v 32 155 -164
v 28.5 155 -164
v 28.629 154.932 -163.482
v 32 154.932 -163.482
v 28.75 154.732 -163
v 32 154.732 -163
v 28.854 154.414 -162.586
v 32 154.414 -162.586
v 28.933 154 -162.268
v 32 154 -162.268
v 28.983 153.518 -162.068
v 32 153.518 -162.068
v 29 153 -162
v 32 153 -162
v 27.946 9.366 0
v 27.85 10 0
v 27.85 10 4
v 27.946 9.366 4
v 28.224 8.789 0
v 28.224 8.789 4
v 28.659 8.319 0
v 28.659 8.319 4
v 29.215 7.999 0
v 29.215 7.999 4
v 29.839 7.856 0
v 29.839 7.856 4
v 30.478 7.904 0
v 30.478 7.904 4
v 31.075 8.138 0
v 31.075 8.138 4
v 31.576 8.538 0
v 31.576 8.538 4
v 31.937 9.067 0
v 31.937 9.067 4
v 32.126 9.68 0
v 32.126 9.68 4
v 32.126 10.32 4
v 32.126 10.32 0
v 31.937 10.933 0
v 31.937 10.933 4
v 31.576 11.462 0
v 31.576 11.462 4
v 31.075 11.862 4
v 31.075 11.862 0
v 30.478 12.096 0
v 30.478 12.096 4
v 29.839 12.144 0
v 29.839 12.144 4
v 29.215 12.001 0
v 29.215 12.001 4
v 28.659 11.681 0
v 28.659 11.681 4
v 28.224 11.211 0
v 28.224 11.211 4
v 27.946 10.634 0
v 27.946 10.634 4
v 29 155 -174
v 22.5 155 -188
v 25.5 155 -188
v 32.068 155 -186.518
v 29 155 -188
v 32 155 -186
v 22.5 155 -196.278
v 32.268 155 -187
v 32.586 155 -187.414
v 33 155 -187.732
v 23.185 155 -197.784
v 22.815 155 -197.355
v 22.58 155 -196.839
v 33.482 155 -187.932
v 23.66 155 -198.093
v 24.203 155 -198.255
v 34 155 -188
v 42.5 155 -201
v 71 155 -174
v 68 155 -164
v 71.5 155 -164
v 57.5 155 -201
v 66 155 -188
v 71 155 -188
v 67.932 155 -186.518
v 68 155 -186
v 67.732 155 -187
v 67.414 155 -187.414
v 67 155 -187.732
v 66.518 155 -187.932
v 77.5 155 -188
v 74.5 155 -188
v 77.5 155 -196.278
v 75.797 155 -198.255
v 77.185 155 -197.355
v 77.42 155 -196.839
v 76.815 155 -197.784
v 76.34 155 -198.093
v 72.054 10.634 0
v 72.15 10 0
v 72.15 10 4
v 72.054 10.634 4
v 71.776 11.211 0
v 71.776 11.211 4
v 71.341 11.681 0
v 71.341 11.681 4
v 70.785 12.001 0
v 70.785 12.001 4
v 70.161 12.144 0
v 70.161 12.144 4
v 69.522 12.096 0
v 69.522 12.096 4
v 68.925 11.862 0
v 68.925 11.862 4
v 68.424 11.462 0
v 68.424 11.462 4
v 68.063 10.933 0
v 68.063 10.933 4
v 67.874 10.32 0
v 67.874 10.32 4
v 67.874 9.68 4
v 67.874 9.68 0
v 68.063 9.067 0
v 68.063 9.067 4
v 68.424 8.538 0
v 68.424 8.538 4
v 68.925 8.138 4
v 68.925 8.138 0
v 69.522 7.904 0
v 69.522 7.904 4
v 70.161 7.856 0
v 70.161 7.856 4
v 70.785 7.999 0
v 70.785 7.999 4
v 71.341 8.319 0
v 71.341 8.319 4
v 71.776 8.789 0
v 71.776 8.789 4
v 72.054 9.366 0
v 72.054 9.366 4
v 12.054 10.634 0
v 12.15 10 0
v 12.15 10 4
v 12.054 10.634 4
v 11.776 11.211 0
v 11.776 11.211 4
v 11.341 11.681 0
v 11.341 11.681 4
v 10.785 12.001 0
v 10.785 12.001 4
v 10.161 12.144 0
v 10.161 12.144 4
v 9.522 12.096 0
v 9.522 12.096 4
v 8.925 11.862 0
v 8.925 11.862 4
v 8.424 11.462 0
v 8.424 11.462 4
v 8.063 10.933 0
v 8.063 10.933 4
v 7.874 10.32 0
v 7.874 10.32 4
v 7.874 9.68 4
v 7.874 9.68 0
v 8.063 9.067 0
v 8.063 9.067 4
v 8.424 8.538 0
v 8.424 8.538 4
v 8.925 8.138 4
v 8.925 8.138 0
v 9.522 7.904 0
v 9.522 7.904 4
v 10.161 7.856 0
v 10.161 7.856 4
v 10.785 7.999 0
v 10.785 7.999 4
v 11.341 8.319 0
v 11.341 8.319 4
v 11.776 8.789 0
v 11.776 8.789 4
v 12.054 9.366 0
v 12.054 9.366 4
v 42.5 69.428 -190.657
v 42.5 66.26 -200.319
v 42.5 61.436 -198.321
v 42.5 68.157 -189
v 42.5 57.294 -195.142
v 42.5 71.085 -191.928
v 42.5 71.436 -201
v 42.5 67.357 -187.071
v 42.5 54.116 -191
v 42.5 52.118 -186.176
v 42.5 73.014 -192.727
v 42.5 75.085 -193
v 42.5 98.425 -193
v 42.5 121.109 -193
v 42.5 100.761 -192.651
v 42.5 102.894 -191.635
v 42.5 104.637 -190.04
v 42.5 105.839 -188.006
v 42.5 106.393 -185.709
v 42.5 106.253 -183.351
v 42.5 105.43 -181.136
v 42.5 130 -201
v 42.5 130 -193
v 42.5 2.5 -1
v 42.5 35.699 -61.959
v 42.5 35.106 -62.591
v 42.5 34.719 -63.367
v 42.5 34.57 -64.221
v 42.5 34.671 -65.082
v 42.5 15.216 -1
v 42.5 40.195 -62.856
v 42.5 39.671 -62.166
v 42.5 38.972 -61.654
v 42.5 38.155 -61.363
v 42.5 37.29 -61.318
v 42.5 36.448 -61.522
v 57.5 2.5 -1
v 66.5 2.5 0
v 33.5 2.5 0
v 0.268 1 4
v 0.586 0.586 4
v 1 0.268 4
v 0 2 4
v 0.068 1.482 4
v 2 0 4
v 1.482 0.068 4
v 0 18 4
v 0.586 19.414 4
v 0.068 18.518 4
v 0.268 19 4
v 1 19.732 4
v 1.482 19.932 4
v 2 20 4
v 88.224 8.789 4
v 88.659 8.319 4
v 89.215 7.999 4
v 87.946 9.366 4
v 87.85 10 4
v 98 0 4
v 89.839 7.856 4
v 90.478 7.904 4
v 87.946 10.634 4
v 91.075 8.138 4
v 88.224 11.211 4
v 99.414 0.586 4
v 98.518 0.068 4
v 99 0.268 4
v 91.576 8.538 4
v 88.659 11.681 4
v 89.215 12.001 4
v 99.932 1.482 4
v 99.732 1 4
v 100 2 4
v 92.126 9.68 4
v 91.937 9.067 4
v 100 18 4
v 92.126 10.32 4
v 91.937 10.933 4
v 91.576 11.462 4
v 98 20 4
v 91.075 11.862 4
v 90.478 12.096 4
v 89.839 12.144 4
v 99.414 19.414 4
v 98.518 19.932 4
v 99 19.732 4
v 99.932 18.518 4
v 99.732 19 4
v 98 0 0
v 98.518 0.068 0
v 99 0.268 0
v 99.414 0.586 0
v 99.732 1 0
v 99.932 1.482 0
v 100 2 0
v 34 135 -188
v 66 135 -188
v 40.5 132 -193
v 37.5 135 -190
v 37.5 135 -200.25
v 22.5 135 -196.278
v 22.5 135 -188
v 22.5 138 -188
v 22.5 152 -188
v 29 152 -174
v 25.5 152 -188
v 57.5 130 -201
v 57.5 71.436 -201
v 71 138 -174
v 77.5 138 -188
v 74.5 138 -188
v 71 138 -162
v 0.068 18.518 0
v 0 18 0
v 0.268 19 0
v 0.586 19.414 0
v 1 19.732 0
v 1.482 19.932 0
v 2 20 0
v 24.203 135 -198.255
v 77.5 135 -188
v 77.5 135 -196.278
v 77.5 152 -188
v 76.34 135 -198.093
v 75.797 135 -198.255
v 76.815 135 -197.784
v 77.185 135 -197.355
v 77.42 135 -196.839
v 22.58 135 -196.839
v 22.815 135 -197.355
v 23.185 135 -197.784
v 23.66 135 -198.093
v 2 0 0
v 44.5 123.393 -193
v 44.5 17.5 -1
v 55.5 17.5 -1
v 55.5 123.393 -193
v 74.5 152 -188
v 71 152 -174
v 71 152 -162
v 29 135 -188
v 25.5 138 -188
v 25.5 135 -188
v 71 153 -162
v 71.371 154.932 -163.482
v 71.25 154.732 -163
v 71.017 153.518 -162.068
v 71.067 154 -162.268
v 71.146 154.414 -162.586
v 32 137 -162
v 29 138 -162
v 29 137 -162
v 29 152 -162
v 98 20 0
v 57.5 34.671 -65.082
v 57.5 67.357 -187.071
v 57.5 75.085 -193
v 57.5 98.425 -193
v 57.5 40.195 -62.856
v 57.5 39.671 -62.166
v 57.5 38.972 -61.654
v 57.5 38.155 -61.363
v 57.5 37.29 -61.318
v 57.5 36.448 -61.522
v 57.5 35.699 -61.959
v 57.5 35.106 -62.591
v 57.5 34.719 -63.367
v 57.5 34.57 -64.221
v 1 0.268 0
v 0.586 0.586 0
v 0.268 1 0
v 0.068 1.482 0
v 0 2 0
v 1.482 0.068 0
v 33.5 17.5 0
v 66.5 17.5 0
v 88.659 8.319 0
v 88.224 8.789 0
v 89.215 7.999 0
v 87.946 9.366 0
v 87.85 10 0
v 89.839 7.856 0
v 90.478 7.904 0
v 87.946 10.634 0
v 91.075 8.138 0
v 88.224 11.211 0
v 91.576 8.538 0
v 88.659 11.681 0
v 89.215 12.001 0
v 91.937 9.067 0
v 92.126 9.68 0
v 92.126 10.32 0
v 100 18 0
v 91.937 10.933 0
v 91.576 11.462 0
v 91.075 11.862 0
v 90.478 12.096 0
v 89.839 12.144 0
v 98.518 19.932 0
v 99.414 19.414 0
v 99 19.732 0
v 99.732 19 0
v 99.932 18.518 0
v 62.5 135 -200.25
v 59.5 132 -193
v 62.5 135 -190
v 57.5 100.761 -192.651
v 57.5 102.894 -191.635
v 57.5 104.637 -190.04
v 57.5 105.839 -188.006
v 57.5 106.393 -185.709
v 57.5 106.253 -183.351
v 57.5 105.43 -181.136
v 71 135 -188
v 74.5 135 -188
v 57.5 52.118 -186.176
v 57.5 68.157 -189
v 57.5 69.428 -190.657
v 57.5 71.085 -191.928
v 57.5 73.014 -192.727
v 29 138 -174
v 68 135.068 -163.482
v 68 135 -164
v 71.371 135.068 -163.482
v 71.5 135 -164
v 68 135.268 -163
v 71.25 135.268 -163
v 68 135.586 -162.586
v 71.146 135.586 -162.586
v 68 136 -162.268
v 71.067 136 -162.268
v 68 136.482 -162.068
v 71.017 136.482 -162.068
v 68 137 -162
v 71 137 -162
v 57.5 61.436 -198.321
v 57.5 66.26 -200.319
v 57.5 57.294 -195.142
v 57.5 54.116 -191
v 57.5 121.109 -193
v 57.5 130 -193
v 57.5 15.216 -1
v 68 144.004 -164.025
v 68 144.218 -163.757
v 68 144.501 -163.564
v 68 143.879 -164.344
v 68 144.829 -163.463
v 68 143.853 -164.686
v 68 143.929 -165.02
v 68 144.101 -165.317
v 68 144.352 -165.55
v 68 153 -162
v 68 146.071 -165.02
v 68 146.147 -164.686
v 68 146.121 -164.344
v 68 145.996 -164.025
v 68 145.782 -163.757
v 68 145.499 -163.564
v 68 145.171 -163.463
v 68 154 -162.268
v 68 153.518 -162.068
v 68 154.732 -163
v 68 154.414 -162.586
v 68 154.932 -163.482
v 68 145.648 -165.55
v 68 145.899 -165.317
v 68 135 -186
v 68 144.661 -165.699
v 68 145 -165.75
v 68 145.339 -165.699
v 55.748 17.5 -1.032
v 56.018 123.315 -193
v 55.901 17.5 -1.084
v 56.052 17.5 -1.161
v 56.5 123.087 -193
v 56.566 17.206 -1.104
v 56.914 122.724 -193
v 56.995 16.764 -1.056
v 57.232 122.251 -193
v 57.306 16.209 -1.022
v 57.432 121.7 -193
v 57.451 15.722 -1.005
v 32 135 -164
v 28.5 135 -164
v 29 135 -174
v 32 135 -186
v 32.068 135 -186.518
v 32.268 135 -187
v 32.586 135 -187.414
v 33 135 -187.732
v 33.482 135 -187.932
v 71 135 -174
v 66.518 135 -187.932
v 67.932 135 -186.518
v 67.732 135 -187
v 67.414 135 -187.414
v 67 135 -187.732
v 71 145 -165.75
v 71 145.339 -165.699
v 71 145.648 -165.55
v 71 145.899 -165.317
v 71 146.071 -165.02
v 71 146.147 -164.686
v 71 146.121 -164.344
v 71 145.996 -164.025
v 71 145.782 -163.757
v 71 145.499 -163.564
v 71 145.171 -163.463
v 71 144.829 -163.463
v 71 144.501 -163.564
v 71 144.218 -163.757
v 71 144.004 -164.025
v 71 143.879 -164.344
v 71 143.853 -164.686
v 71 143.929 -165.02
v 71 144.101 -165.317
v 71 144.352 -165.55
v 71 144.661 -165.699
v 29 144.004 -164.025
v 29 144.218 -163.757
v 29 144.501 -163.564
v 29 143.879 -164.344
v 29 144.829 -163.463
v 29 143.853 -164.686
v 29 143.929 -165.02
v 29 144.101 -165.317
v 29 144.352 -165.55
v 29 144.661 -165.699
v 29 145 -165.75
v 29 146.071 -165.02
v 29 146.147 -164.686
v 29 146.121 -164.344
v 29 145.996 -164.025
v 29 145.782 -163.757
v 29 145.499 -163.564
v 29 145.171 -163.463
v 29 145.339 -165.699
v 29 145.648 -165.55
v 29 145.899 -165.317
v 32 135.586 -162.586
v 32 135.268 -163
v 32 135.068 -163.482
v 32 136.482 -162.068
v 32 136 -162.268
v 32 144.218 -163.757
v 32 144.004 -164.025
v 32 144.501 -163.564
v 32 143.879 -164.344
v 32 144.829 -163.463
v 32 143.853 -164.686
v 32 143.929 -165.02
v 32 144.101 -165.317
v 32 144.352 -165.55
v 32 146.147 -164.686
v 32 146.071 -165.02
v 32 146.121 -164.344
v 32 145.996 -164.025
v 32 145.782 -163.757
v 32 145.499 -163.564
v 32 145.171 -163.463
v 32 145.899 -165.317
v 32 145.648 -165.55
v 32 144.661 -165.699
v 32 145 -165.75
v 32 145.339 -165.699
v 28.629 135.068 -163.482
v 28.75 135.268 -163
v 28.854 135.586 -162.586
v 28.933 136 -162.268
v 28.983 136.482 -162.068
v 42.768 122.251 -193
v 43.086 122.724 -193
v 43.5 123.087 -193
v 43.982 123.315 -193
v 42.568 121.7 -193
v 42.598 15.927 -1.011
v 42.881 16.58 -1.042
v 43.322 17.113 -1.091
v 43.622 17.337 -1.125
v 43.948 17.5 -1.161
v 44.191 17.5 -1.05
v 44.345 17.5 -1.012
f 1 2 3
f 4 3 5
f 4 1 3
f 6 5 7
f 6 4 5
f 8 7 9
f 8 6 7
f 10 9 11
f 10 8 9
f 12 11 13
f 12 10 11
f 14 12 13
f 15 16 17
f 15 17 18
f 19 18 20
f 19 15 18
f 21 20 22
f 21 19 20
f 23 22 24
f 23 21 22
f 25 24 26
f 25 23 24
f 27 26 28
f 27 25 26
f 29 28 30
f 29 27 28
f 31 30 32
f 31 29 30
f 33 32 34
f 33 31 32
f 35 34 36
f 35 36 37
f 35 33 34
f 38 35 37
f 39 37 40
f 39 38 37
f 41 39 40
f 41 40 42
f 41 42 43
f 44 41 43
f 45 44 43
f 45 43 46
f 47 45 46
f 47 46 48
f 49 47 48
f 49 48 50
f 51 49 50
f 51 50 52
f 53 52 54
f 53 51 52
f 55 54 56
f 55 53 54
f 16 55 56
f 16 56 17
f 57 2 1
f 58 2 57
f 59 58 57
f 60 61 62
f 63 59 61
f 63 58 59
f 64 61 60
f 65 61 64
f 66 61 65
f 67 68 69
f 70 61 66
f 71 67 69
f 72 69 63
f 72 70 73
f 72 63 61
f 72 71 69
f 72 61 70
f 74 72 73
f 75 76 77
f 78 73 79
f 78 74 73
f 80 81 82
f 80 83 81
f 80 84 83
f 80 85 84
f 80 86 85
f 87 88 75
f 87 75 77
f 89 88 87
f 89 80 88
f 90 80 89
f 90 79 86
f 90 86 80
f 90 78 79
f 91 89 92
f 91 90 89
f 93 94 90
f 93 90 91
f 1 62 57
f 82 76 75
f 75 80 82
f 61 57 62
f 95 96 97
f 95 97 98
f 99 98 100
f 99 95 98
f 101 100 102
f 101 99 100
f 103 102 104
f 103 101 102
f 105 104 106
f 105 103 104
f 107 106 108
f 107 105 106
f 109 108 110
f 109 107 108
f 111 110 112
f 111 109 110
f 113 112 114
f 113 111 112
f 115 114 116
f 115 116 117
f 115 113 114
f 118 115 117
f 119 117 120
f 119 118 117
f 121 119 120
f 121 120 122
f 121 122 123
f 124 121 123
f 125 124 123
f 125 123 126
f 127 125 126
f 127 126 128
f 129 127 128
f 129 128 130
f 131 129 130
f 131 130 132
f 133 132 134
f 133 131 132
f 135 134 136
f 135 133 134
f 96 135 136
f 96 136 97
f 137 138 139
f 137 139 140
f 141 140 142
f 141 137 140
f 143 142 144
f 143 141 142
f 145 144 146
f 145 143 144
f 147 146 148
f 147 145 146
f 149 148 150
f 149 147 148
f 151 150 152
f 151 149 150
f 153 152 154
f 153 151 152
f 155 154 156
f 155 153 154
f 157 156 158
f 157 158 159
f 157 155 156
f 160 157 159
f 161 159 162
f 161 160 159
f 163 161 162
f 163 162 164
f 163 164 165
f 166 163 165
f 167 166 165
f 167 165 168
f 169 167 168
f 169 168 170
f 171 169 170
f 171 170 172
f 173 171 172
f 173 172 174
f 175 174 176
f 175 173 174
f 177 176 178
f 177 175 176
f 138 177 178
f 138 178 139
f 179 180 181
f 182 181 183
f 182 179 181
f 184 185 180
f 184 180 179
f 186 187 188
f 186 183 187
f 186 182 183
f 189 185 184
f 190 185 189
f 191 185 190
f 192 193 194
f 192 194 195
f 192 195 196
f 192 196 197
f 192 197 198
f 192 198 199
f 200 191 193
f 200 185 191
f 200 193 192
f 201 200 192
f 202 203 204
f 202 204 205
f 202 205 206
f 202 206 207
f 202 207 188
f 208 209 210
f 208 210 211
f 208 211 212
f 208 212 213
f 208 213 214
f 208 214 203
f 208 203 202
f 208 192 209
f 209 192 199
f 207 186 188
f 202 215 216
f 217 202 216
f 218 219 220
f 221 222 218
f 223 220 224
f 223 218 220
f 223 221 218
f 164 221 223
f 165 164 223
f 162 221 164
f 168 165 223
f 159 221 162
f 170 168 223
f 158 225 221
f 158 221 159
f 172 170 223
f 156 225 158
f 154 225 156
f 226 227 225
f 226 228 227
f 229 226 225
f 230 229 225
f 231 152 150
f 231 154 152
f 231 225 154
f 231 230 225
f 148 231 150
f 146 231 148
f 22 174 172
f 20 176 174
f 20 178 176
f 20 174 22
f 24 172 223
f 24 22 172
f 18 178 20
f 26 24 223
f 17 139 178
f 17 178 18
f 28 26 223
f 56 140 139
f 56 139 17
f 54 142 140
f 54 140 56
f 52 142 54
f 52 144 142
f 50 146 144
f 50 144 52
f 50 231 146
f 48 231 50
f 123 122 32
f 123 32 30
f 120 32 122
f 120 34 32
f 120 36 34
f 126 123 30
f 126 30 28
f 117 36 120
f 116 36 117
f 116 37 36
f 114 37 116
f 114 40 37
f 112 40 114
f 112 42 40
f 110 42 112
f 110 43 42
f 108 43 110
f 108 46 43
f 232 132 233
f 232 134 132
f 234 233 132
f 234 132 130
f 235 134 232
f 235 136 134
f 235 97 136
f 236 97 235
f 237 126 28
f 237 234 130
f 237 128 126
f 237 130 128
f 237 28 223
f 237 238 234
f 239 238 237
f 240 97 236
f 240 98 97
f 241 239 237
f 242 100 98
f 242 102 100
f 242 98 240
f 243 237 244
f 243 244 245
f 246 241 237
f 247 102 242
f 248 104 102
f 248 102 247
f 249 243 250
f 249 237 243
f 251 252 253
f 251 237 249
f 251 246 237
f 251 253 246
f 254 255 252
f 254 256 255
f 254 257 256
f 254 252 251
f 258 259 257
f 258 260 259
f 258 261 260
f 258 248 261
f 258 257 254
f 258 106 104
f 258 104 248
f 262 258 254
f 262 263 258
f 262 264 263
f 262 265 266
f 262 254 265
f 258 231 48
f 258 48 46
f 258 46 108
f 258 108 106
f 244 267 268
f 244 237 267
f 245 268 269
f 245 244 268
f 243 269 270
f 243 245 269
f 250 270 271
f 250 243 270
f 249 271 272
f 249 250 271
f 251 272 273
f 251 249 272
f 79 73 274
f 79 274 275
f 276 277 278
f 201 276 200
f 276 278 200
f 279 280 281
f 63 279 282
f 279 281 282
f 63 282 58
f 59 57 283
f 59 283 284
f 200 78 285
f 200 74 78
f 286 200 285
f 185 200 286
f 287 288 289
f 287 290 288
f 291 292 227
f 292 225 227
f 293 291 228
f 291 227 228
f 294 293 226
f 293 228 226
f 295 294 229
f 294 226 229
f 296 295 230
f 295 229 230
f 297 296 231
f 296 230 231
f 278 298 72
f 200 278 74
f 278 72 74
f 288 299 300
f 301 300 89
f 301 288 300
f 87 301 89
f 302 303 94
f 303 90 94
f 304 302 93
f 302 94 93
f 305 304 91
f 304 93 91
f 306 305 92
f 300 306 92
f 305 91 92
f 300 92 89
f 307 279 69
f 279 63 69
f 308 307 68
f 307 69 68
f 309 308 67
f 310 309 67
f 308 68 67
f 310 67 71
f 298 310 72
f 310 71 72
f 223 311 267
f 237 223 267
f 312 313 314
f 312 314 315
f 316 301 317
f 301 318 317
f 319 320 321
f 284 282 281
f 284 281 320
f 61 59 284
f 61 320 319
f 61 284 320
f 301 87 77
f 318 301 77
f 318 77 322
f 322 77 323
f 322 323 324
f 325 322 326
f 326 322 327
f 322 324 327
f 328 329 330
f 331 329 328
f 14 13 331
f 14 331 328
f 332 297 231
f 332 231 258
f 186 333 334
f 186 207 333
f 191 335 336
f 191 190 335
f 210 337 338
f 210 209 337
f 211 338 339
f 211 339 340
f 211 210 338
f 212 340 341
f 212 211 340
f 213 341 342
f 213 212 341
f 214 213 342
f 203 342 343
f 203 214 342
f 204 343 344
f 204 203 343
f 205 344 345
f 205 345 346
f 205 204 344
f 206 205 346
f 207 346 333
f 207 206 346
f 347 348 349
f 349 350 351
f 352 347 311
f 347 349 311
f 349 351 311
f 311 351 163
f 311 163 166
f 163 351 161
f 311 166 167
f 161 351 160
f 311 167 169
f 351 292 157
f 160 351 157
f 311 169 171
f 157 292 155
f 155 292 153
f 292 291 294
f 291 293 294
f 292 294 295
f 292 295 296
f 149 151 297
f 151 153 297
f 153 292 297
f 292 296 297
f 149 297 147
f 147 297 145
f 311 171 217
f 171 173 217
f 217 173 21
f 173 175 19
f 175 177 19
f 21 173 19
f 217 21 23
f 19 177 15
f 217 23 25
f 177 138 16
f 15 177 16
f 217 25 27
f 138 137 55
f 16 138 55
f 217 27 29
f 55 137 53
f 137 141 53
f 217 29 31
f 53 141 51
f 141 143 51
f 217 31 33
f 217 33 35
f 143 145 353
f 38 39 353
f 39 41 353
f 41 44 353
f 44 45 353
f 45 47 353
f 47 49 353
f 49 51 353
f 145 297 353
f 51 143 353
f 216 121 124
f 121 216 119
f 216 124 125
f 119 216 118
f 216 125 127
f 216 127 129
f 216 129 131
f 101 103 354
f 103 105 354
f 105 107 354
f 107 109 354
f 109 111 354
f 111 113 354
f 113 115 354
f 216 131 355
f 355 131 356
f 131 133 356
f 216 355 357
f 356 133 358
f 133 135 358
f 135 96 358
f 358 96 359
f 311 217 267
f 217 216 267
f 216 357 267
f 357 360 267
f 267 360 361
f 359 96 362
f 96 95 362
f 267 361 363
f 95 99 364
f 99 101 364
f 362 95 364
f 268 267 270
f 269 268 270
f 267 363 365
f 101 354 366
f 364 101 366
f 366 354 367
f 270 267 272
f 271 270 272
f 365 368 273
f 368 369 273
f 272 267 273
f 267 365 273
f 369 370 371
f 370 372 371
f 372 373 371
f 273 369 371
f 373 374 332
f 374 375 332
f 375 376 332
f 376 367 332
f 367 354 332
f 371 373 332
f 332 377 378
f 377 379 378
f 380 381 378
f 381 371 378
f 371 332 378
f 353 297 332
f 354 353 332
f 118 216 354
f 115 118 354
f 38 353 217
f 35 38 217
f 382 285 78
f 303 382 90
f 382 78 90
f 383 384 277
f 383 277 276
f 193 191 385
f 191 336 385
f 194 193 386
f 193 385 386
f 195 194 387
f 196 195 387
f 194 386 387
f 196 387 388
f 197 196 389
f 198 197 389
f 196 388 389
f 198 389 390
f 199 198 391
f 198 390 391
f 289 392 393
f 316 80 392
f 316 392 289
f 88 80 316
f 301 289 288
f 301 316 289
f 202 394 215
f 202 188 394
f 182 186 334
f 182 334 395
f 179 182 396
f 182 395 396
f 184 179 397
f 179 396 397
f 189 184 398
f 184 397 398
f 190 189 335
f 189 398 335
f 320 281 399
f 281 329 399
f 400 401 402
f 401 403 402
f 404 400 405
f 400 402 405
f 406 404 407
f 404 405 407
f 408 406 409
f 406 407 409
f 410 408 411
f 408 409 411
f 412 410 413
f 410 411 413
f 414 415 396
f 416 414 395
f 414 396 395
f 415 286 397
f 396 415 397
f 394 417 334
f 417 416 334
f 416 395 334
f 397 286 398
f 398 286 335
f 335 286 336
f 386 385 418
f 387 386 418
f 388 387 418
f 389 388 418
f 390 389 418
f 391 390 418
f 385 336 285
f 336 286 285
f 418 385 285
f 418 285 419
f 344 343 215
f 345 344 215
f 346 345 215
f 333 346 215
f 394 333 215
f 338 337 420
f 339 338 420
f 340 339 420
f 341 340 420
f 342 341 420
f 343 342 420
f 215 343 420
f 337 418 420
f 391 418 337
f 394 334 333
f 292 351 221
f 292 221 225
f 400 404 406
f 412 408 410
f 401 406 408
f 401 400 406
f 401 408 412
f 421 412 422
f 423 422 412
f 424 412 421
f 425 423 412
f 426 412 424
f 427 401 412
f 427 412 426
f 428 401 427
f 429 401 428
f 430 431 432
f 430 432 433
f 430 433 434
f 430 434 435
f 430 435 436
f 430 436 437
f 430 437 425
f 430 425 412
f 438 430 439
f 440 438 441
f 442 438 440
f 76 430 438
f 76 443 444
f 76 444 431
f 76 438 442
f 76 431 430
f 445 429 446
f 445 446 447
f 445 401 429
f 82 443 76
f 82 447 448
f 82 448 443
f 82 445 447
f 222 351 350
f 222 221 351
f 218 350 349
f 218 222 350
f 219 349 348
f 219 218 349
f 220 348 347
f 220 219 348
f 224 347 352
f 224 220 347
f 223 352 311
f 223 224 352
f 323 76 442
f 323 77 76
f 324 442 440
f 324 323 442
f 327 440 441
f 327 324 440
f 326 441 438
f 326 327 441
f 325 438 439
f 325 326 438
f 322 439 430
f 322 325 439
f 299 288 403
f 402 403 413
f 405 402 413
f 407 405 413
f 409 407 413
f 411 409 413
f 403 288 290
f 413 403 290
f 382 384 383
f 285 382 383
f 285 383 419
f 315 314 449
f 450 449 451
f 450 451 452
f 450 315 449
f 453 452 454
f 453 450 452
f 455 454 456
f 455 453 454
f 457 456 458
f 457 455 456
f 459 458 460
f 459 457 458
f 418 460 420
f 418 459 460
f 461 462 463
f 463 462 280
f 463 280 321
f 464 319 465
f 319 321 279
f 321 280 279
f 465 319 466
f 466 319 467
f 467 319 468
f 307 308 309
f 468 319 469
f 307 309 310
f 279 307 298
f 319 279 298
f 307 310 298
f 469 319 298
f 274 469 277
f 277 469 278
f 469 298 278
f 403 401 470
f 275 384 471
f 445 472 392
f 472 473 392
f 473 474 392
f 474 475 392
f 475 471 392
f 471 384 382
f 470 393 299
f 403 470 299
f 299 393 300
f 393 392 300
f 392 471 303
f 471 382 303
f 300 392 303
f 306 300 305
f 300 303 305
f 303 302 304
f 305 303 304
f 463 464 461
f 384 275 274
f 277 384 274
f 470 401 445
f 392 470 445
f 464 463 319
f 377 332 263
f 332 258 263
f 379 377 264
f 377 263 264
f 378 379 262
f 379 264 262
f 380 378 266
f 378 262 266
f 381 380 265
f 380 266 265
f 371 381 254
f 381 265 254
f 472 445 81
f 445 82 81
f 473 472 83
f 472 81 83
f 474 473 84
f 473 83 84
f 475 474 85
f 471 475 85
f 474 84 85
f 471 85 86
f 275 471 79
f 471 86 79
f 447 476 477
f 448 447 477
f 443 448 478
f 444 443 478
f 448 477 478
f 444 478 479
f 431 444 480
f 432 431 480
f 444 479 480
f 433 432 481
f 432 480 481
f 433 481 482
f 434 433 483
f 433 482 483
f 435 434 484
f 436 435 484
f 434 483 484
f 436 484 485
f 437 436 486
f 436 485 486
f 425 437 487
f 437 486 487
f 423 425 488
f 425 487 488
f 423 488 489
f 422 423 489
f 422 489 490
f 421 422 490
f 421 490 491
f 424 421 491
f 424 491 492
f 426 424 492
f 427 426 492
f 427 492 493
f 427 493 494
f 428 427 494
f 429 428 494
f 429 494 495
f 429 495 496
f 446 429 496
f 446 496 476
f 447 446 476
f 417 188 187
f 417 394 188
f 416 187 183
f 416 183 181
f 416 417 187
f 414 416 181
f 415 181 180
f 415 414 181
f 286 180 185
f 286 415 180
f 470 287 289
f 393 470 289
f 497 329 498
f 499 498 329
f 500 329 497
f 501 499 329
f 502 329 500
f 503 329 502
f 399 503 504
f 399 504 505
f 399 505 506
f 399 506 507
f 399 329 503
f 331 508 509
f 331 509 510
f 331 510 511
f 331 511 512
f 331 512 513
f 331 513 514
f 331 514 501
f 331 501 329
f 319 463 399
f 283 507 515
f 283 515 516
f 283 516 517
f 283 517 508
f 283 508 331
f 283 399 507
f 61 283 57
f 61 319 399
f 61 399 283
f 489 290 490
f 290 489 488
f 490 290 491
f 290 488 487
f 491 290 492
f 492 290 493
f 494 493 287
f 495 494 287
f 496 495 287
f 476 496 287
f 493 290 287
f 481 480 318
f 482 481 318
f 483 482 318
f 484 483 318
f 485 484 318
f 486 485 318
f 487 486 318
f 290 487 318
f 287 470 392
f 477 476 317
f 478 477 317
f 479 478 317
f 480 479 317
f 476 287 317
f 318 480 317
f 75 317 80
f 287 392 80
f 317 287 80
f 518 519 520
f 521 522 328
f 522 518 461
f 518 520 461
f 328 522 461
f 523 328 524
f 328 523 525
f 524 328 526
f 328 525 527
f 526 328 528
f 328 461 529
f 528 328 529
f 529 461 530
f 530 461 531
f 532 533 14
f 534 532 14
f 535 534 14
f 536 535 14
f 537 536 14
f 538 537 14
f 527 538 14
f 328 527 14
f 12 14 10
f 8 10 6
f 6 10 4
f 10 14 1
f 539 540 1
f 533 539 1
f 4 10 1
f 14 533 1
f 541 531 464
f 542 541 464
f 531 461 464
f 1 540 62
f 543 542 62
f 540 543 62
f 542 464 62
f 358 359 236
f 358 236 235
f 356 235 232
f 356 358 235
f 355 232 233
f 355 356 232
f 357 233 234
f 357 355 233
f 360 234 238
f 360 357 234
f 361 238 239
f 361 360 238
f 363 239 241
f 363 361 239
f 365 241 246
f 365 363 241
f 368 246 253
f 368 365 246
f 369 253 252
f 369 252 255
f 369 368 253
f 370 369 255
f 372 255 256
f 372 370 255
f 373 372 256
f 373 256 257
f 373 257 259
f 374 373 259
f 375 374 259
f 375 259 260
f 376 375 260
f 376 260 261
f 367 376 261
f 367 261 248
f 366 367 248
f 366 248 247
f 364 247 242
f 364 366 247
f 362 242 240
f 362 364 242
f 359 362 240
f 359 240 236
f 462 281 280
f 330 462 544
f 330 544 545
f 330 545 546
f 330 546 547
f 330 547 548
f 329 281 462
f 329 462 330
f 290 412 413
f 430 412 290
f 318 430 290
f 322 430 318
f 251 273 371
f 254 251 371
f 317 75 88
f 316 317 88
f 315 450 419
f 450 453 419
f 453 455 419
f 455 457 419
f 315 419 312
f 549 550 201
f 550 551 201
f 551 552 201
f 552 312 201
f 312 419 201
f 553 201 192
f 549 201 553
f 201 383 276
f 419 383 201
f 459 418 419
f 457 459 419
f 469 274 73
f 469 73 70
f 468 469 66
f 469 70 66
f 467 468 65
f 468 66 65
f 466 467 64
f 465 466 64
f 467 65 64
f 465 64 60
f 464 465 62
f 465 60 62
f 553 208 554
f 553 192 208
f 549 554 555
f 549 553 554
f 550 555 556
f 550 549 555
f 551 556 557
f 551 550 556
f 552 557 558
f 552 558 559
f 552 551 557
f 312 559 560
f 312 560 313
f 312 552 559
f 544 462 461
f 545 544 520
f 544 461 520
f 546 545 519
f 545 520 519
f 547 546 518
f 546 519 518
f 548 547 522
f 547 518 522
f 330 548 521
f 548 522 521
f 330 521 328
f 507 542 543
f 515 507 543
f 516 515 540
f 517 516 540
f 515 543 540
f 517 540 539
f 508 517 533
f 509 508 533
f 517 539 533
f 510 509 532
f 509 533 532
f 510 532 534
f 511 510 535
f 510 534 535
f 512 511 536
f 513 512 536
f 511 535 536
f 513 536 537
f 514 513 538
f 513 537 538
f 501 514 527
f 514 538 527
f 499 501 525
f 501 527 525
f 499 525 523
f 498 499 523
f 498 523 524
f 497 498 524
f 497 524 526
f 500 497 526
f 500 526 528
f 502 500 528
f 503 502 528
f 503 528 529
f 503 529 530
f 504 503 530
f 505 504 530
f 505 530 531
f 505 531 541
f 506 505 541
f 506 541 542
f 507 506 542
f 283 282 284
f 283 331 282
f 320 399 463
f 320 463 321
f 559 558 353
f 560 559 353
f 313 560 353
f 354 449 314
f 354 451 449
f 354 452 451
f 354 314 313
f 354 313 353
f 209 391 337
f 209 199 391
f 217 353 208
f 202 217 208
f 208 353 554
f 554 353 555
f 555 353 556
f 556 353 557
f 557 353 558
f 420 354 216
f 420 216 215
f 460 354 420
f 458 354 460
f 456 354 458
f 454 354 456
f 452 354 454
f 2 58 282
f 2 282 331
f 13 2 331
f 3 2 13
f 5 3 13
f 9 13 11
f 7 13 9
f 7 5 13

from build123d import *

# Parameters (mm, degrees)
SKETCH1_W           = 100
SKETCH1_H           = 20
SKETCH1_R           = 2.15
BOSS_EXTRUDE1_DEPTH = 4
BOSS_EXTRUDE2_DEPTH = 7.5
FILLET1_R           = 8
FILLET2_R           = 3
FILLET3_R           = 20
SKETCH5_W           = 9.5
SKETCH5_H           = 20
SKETCH5_W_2         = 10.5
SKETCH5_W_3         = 7.5
BOSS_EXTRUDE3_DEPTH = 5
SKETCH6_W           = 3
SKETCH6_H           = 20
BOSS_EXTRUDE4_DEPTH = 26
BOSS_EXTRUDE5_DEPTH = 3
LPATTERN2_COUNT     = 2
LPATTERN2_PITCH     = 17
SKETCH9_R           = 1.15
CUT_EXTRUDE1_DEPTH  = 264.565931031
BOSS_EXTRUDE6_DEPTH = 20
FILLET4_R           = 2
CHAMFER1_SIZE       = 3
CHAMFER2_SIZE       = 5
FILLET5_R           = 2
FILLET6_R           = 2
BOSS_EXTRUDE7_DEPTH = 15
FILLET7_R           = 2


with BuildPart() as part:
    # Sketch1 → Boss-Extrude1 (new body)
    with BuildSketch(Plane.XY):
        with Locations((50, 10)):
            Rectangle(SKETCH1_W, SKETCH1_H)
        with Locations((70, 10)):
            Circle(SKETCH1_R, mode=Mode.SUBTRACT)
        with Locations(Location((30, 10, 0), (0, 0, 180))):
            Circle(SKETCH1_R, mode=Mode.SUBTRACT)
        with Locations((10, 10)):
            Circle(SKETCH1_R, mode=Mode.SUBTRACT)
        with Locations(Location((90, 10, 0), (0, 0, 180))):
            Circle(SKETCH1_R, mode=Mode.SUBTRACT)
    extrude(amount=BOSS_EXTRUDE1_DEPTH)

    # Fillet6
    fillet6_edges = [part.edges().sort_by_distance(p)[0] for p in [
        (0, 20, 2),
        (100, 20, 2),
        (100, 0, 2),
        (0, 0, 2),
    ]]
    fillet(fillet6_edges, radius=FILLET6_R)



with BuildPart() as body_2:
    # Sketch4 → Boss-Extrude2 (new, symmetric)
    with BuildSketch(Plane.ZY.offset(-50)):
        Polygon((0, 2.5), (0, 17.5), (-1, 17.5), (-193, 123.393201871), (-193, 155), (-201, 155), (-201, 56.089838486), (-1, 2.5), align=None)
        Polygon((-41.271401161, 28.290689419), (-193, 68.946244947), (-193, 111.973122473), align=None, mode=Mode.SUBTRACT)
    extrude(amount=BOSS_EXTRUDE2_DEPTH, both=True)

    # Fillet1
    fillet1_edges = [body_2.edges().sort_by_distance(p)[0] for p in [
        (50, 111.973122473, -193),
        (50, 68.946244947, -193),
    ]]
    fillet(fillet1_edges, radius=FILLET1_R)

    # Fillet2
    fillet2_edges = [body_2.edges().sort_by_distance(p)[0] for p in [
        (50, 28.290689419, -41.271401161),
    ]]
    fillet(fillet2_edges, radius=FILLET2_R)

    # Fillet3
    fillet3_edges = [body_2.edges().sort_by_distance(p)[0] for p in [
        (50, 56.089838486, -201),
    ]]
    fillet(fillet3_edges, radius=FILLET3_R)

    # Sketch5 → Boss-Extrude3 (add, symmetric)
    with BuildSketch(Plane.XY.offset(-193)):
        with Locations((27.25, 145)):
            Rectangle(SKETCH5_W, SKETCH5_H)
        with Locations((37.25, 145)):
            Rectangle(SKETCH5_W_2, SKETCH5_H)
        with Locations((46.25, 145)):
            Rectangle(SKETCH5_W_3, SKETCH5_H)
        with Locations((53.75, 145)):
            Rectangle(SKETCH5_W_3, SKETCH5_H)
        with Locations((62.75, 145)):
            Rectangle(SKETCH5_W_2, SKETCH5_H)
        with Locations((72.75, 145)):
            Rectangle(SKETCH5_W, SKETCH5_H)
    extrude(amount=BOSS_EXTRUDE3_DEPTH, both=True)

    # Sketch6 → Boss-Extrude4 (add)
    with BuildSketch(Plane.XY.offset(-188)):
        with Locations((30.5, 145)):
            Rectangle(SKETCH6_W, SKETCH6_H)
        with Locations((69.5, 145)):
            Rectangle(SKETCH6_W, SKETCH6_H)
    extrude(amount=BOSS_EXTRUDE4_DEPTH)

    # Sketch8 → Boss-Extrude5 (add)
    with BuildSketch(Plane(origin=(0, 155, 0), x_dir=(1, 0, 0), z_dir=(0, 1, 0))):
        Polygon((22.5, 188), (29, 162), (29, 174), (25.5, 188), align=None)
        Polygon((74.5, 188), (77.5, 188), (71, 162), (71, 174), align=None)
    boss_extrude5 = extrude(amount=-BOSS_EXTRUDE5_DEPTH)

    # LPattern2: Boss-Extrude5 ×2
    with Locations(*[(0, -i * LPATTERN2_PITCH, 0) for i in range(1, LPATTERN2_COUNT)]):
        add(boss_extrude5)

    # Sketch9 → Cut-Extrude1 (cut, through all)
    with BuildSketch(Plane(origin=(71, 0, 0), x_dir=(0, 0, -1), z_dir=(1, 0, 0))):
        with Locations((164.6, 145)):
            Circle(SKETCH9_R)
    extrude(amount=-CUT_EXTRUDE1_DEPTH, mode=Mode.SUBTRACT)

    # Sketch10 → Boss-Extrude6 (add)
    with BuildSketch(Plane(origin=(0, 155, 0), x_dir=(1, 0, 0), z_dir=(0, 1, 0))):
        Polygon((57.5, 201), (57.5, 198), (77.5, 198), align=None)
        Polygon((42.5, 201), (42.5, 198), (22.5, 198), align=None)
    extrude(amount=-BOSS_EXTRUDE6_DEPTH)

    # Fillet4
    fillet4_edges = [body_2.edges().sort_by_distance(p)[0] for p in [
        (32, 145, -188),
        (68, 145, -188),
        (77.5, 145, -198),
        (22.5, 145, -198),
    ]]
    fillet(fillet4_edges, radius=FILLET4_R)

    # Chamfer1
    chamfer1_edges = [body_2.edges().sort_by_distance(p)[0] for p in [
        (50, 135, -193),
    ]]
    chamfer(chamfer1_edges, length=CHAMFER1_SIZE)

    # Chamfer2
    # the kernel refuses this chamfer: 5 mm, written as the material it adds along each edge
    with BuildSketch(Plane(origin=(57.5, 135, -177.14158506), x_dir=(0.9996219169112968, 0.0274958766105877, 0), z_dir=(0, 0, -1))) as chamfer2_piece_1_section:
        Polygon((CHAMFER2_SIZE * 0.999621916911, CHAMFER2_SIZE * 0.0274958766106), (-CHAMFER2_SIZE * 0.0274958766106, CHAMFER2_SIZE * 0.999621916911), (0, 0), align=None)
    chamfer2_piece_1 = extrude(amount=23.85841494, mode=Mode.PRIVATE)
    chamfer2_piece_1 = split(chamfer2_piece_1, bisect_by=Plane(origin=(57.857106813, 131.163616626, -193.836383374), z_dir=(0, -0.7071067811865476, 0.7071067811865476)), keep=Keep.TOP, mode=Mode.PRIVATE)
    chamfer2_piece_1 = split(chamfer2_piece_1, bisect_by=Plane(origin=(57.857106813, 130.884822168, -193), z_dir=(0, 0, -1)), keep=Keep.TOP, mode=Mode.PRIVATE)
    add(chamfer2_piece_1)
    with BuildSketch(Plane(origin=(57.5, 135, -177.14158506), x_dir=(0.9996219169112968, 0.0274958766105877, 0), z_dir=(0, 0, -1))) as chamfer2_piece_2_section:
        Polygon((CHAMFER2_SIZE * 0.999621916911, CHAMFER2_SIZE * 0.0274958766106), (-CHAMFER2_SIZE * 0.0274958766106, CHAMFER2_SIZE * 0.999621916911), (0, 0), align=None)
    chamfer2_piece_2 = extrude(amount=23.85841494, mode=Mode.PRIVATE)
    chamfer2_piece_2 = split(chamfer2_piece_2, bisect_by=Plane(origin=(59.611963913, 133.659604806, -191.340395194), z_dir=(0, 0.7071067811865476, -0.7071067811865476)), keep=Keep.TOP, mode=Mode.PRIVATE)
    chamfer2_piece_2 = split(chamfer2_piece_2, bisect_by=Plane(origin=(59.611963913, 134.212806408, -193), z_dir=(0, 0, 1)), keep=Keep.TOP, mode=Mode.PRIVATE)
    add(chamfer2_piece_2)
    with BuildSketch(Plane(origin=(57.5, 135, -177.14158506), x_dir=(0.9996219169112968, 0.0274958766105877, 0), z_dir=(0, 0, -1))) as chamfer2_piece_3_section:
        Polygon((CHAMFER2_SIZE * 0.999621916911, CHAMFER2_SIZE * 0.0274958766106), (-CHAMFER2_SIZE * 0.0274958766106, CHAMFER2_SIZE * 0.999621916911), (0, 0), align=None)
    chamfer2_piece_3 = extrude(amount=23.85841494, mode=Mode.PRIVATE)
    chamfer2_piece_3 = split(chamfer2_piece_3, bisect_by=Plane(origin=(59.139397436, 130.720913617, -194.279086383), z_dir=(0, 0.7071067811865476, -0.7071067811865476)), keep=Keep.TOP, mode=Mode.PRIVATE)
    chamfer2_piece_3 = split(chamfer2_piece_3, bisect_by=Plane(origin=(59.699836307, 133.375592649, -200.670024554), z_dir=(-0.14834045293024603, 0, 0.9889363528682974)), keep=Keep.TOP, mode=Mode.PRIVATE)
    chamfer2_piece_3 = split(chamfer2_piece_3, bisect_by=Plane(origin=(59.139397436, 133.375592649, -193), z_dir=(0, 0, -1)), keep=Keep.TOP, mode=Mode.PRIVATE)
    add(chamfer2_piece_3)
    with BuildSketch(Plane(origin=(42.5, 135, -201), x_dir=(-0.9996219169112968, 0.0274958766105877, 0), z_dir=(0, 0, 1))) as chamfer2_piece_4_section:
        Polygon((CHAMFER2_SIZE * 0.999621916911, CHAMFER2_SIZE * 0.0274958766106), (-CHAMFER2_SIZE * 0.0274958766106, CHAMFER2_SIZE * 0.999621916911), (0, 0), align=None)
    chamfer2_piece_4 = extrude(amount=23.85841494, mode=Mode.PRIVATE)
    chamfer2_piece_4 = split(chamfer2_piece_4, bisect_by=Plane(origin=(40.860602564, 130.720913617, -194.279086383), z_dir=(0, 0.7071067811865476, -0.7071067811865476)), keep=Keep.TOP, mode=Mode.PRIVATE)
    chamfer2_piece_4 = split(chamfer2_piece_4, bisect_by=Plane(origin=(40.300163693, 133.375592649, -200.670024554), z_dir=(0.1483404529302461, 0, 0.9889363528682974)), keep=Keep.TOP, mode=Mode.PRIVATE)
    chamfer2_piece_4 = split(chamfer2_piece_4, bisect_by=Plane(origin=(40.860602564, 133.375592649, -193), z_dir=(0, 0, -1)), keep=Keep.TOP, mode=Mode.PRIVATE)
    add(chamfer2_piece_4)
    with BuildSketch(Plane(origin=(42.5, 135, -201), x_dir=(-0.9996219169112968, 0.0274958766105877, 0), z_dir=(0, 0, 1))) as chamfer2_piece_5_section:
        Polygon((CHAMFER2_SIZE * 0.999621916911, CHAMFER2_SIZE * 0.0274958766106), (-CHAMFER2_SIZE * 0.0274958766106, CHAMFER2_SIZE * 0.999621916911), (0, 0), align=None)
    chamfer2_piece_5 = extrude(amount=23.85841494, mode=Mode.PRIVATE)
    chamfer2_piece_5 = split(chamfer2_piece_5, bisect_by=Plane(origin=(42.142893187, 131.163616626, -193.836383374), z_dir=(0, -0.7071067811865476, 0.7071067811865476)), keep=Keep.TOP, mode=Mode.PRIVATE)
    chamfer2_piece_5 = split(chamfer2_piece_5, bisect_by=Plane(origin=(42.142893187, 130.884822168, -193), z_dir=(0, 0, -1)), keep=Keep.TOP, mode=Mode.PRIVATE)
    add(chamfer2_piece_5)
    with BuildSketch(Plane(origin=(42.5, 135, -201), x_dir=(-0.9996219169112968, 0.0274958766105877, 0), z_dir=(0, 0, 1))) as chamfer2_piece_6_section:
        Polygon((CHAMFER2_SIZE * 0.999621916911, CHAMFER2_SIZE * 0.0274958766106), (-CHAMFER2_SIZE * 0.0274958766106, CHAMFER2_SIZE * 0.999621916911), (0, 0), align=None)
    chamfer2_piece_6 = extrude(amount=23.85841494, mode=Mode.PRIVATE)
    chamfer2_piece_6 = split(chamfer2_piece_6, bisect_by=Plane(origin=(40.388036087, 133.659604806, -191.340395194), z_dir=(0, 0.7071067811865476, -0.7071067811865476)), keep=Keep.TOP, mode=Mode.PRIVATE)
    chamfer2_piece_6 = split(chamfer2_piece_6, bisect_by=Plane(origin=(40.388036087, 134.212806408, -193), z_dir=(0, 0, 1)), keep=Keep.TOP, mode=Mode.PRIVATE)
    add(chamfer2_piece_6)

    # Fillet5
    fillet5_edges = [body_2.edges().sort_by_distance(p)[0] for p in [
        (30.5, 155, -162),
        (30.5, 135, -162),
        (69.5, 155, -162),
        (69.5, 135, -162),
    ]]
    fillet(fillet5_edges, radius=FILLET5_R)


with BuildPart() as part_1:
    add(part.part)

    add(body_2.part)  # Boss-Extrude7 merges body 2
    # Sketch11 → Boss-Extrude7 (add)
    with BuildSketch(Plane(origin=(0, 17.5, 0), x_dir=(1, 0, 0), z_dir=(0, 1, 0))):
        Polygon((57.5, 1), (57.5, 0), (66.5, 0), align=None)
        Polygon((42.5, 1), (42.5, 0), (33.5, 0), align=None)
    extrude(amount=-BOSS_EXTRUDE7_DEPTH)

    # Fillet7
    fillet7_edges = [part_1.edges().sort_by_distance(p)[0] for p in [
        (57.5, 70.446600935, -97),
        (42.5, 70.446600935, -97),
    ]]
    fillet(fillet7_edges, radius=FILLET7_R)


solid = part_1.part
